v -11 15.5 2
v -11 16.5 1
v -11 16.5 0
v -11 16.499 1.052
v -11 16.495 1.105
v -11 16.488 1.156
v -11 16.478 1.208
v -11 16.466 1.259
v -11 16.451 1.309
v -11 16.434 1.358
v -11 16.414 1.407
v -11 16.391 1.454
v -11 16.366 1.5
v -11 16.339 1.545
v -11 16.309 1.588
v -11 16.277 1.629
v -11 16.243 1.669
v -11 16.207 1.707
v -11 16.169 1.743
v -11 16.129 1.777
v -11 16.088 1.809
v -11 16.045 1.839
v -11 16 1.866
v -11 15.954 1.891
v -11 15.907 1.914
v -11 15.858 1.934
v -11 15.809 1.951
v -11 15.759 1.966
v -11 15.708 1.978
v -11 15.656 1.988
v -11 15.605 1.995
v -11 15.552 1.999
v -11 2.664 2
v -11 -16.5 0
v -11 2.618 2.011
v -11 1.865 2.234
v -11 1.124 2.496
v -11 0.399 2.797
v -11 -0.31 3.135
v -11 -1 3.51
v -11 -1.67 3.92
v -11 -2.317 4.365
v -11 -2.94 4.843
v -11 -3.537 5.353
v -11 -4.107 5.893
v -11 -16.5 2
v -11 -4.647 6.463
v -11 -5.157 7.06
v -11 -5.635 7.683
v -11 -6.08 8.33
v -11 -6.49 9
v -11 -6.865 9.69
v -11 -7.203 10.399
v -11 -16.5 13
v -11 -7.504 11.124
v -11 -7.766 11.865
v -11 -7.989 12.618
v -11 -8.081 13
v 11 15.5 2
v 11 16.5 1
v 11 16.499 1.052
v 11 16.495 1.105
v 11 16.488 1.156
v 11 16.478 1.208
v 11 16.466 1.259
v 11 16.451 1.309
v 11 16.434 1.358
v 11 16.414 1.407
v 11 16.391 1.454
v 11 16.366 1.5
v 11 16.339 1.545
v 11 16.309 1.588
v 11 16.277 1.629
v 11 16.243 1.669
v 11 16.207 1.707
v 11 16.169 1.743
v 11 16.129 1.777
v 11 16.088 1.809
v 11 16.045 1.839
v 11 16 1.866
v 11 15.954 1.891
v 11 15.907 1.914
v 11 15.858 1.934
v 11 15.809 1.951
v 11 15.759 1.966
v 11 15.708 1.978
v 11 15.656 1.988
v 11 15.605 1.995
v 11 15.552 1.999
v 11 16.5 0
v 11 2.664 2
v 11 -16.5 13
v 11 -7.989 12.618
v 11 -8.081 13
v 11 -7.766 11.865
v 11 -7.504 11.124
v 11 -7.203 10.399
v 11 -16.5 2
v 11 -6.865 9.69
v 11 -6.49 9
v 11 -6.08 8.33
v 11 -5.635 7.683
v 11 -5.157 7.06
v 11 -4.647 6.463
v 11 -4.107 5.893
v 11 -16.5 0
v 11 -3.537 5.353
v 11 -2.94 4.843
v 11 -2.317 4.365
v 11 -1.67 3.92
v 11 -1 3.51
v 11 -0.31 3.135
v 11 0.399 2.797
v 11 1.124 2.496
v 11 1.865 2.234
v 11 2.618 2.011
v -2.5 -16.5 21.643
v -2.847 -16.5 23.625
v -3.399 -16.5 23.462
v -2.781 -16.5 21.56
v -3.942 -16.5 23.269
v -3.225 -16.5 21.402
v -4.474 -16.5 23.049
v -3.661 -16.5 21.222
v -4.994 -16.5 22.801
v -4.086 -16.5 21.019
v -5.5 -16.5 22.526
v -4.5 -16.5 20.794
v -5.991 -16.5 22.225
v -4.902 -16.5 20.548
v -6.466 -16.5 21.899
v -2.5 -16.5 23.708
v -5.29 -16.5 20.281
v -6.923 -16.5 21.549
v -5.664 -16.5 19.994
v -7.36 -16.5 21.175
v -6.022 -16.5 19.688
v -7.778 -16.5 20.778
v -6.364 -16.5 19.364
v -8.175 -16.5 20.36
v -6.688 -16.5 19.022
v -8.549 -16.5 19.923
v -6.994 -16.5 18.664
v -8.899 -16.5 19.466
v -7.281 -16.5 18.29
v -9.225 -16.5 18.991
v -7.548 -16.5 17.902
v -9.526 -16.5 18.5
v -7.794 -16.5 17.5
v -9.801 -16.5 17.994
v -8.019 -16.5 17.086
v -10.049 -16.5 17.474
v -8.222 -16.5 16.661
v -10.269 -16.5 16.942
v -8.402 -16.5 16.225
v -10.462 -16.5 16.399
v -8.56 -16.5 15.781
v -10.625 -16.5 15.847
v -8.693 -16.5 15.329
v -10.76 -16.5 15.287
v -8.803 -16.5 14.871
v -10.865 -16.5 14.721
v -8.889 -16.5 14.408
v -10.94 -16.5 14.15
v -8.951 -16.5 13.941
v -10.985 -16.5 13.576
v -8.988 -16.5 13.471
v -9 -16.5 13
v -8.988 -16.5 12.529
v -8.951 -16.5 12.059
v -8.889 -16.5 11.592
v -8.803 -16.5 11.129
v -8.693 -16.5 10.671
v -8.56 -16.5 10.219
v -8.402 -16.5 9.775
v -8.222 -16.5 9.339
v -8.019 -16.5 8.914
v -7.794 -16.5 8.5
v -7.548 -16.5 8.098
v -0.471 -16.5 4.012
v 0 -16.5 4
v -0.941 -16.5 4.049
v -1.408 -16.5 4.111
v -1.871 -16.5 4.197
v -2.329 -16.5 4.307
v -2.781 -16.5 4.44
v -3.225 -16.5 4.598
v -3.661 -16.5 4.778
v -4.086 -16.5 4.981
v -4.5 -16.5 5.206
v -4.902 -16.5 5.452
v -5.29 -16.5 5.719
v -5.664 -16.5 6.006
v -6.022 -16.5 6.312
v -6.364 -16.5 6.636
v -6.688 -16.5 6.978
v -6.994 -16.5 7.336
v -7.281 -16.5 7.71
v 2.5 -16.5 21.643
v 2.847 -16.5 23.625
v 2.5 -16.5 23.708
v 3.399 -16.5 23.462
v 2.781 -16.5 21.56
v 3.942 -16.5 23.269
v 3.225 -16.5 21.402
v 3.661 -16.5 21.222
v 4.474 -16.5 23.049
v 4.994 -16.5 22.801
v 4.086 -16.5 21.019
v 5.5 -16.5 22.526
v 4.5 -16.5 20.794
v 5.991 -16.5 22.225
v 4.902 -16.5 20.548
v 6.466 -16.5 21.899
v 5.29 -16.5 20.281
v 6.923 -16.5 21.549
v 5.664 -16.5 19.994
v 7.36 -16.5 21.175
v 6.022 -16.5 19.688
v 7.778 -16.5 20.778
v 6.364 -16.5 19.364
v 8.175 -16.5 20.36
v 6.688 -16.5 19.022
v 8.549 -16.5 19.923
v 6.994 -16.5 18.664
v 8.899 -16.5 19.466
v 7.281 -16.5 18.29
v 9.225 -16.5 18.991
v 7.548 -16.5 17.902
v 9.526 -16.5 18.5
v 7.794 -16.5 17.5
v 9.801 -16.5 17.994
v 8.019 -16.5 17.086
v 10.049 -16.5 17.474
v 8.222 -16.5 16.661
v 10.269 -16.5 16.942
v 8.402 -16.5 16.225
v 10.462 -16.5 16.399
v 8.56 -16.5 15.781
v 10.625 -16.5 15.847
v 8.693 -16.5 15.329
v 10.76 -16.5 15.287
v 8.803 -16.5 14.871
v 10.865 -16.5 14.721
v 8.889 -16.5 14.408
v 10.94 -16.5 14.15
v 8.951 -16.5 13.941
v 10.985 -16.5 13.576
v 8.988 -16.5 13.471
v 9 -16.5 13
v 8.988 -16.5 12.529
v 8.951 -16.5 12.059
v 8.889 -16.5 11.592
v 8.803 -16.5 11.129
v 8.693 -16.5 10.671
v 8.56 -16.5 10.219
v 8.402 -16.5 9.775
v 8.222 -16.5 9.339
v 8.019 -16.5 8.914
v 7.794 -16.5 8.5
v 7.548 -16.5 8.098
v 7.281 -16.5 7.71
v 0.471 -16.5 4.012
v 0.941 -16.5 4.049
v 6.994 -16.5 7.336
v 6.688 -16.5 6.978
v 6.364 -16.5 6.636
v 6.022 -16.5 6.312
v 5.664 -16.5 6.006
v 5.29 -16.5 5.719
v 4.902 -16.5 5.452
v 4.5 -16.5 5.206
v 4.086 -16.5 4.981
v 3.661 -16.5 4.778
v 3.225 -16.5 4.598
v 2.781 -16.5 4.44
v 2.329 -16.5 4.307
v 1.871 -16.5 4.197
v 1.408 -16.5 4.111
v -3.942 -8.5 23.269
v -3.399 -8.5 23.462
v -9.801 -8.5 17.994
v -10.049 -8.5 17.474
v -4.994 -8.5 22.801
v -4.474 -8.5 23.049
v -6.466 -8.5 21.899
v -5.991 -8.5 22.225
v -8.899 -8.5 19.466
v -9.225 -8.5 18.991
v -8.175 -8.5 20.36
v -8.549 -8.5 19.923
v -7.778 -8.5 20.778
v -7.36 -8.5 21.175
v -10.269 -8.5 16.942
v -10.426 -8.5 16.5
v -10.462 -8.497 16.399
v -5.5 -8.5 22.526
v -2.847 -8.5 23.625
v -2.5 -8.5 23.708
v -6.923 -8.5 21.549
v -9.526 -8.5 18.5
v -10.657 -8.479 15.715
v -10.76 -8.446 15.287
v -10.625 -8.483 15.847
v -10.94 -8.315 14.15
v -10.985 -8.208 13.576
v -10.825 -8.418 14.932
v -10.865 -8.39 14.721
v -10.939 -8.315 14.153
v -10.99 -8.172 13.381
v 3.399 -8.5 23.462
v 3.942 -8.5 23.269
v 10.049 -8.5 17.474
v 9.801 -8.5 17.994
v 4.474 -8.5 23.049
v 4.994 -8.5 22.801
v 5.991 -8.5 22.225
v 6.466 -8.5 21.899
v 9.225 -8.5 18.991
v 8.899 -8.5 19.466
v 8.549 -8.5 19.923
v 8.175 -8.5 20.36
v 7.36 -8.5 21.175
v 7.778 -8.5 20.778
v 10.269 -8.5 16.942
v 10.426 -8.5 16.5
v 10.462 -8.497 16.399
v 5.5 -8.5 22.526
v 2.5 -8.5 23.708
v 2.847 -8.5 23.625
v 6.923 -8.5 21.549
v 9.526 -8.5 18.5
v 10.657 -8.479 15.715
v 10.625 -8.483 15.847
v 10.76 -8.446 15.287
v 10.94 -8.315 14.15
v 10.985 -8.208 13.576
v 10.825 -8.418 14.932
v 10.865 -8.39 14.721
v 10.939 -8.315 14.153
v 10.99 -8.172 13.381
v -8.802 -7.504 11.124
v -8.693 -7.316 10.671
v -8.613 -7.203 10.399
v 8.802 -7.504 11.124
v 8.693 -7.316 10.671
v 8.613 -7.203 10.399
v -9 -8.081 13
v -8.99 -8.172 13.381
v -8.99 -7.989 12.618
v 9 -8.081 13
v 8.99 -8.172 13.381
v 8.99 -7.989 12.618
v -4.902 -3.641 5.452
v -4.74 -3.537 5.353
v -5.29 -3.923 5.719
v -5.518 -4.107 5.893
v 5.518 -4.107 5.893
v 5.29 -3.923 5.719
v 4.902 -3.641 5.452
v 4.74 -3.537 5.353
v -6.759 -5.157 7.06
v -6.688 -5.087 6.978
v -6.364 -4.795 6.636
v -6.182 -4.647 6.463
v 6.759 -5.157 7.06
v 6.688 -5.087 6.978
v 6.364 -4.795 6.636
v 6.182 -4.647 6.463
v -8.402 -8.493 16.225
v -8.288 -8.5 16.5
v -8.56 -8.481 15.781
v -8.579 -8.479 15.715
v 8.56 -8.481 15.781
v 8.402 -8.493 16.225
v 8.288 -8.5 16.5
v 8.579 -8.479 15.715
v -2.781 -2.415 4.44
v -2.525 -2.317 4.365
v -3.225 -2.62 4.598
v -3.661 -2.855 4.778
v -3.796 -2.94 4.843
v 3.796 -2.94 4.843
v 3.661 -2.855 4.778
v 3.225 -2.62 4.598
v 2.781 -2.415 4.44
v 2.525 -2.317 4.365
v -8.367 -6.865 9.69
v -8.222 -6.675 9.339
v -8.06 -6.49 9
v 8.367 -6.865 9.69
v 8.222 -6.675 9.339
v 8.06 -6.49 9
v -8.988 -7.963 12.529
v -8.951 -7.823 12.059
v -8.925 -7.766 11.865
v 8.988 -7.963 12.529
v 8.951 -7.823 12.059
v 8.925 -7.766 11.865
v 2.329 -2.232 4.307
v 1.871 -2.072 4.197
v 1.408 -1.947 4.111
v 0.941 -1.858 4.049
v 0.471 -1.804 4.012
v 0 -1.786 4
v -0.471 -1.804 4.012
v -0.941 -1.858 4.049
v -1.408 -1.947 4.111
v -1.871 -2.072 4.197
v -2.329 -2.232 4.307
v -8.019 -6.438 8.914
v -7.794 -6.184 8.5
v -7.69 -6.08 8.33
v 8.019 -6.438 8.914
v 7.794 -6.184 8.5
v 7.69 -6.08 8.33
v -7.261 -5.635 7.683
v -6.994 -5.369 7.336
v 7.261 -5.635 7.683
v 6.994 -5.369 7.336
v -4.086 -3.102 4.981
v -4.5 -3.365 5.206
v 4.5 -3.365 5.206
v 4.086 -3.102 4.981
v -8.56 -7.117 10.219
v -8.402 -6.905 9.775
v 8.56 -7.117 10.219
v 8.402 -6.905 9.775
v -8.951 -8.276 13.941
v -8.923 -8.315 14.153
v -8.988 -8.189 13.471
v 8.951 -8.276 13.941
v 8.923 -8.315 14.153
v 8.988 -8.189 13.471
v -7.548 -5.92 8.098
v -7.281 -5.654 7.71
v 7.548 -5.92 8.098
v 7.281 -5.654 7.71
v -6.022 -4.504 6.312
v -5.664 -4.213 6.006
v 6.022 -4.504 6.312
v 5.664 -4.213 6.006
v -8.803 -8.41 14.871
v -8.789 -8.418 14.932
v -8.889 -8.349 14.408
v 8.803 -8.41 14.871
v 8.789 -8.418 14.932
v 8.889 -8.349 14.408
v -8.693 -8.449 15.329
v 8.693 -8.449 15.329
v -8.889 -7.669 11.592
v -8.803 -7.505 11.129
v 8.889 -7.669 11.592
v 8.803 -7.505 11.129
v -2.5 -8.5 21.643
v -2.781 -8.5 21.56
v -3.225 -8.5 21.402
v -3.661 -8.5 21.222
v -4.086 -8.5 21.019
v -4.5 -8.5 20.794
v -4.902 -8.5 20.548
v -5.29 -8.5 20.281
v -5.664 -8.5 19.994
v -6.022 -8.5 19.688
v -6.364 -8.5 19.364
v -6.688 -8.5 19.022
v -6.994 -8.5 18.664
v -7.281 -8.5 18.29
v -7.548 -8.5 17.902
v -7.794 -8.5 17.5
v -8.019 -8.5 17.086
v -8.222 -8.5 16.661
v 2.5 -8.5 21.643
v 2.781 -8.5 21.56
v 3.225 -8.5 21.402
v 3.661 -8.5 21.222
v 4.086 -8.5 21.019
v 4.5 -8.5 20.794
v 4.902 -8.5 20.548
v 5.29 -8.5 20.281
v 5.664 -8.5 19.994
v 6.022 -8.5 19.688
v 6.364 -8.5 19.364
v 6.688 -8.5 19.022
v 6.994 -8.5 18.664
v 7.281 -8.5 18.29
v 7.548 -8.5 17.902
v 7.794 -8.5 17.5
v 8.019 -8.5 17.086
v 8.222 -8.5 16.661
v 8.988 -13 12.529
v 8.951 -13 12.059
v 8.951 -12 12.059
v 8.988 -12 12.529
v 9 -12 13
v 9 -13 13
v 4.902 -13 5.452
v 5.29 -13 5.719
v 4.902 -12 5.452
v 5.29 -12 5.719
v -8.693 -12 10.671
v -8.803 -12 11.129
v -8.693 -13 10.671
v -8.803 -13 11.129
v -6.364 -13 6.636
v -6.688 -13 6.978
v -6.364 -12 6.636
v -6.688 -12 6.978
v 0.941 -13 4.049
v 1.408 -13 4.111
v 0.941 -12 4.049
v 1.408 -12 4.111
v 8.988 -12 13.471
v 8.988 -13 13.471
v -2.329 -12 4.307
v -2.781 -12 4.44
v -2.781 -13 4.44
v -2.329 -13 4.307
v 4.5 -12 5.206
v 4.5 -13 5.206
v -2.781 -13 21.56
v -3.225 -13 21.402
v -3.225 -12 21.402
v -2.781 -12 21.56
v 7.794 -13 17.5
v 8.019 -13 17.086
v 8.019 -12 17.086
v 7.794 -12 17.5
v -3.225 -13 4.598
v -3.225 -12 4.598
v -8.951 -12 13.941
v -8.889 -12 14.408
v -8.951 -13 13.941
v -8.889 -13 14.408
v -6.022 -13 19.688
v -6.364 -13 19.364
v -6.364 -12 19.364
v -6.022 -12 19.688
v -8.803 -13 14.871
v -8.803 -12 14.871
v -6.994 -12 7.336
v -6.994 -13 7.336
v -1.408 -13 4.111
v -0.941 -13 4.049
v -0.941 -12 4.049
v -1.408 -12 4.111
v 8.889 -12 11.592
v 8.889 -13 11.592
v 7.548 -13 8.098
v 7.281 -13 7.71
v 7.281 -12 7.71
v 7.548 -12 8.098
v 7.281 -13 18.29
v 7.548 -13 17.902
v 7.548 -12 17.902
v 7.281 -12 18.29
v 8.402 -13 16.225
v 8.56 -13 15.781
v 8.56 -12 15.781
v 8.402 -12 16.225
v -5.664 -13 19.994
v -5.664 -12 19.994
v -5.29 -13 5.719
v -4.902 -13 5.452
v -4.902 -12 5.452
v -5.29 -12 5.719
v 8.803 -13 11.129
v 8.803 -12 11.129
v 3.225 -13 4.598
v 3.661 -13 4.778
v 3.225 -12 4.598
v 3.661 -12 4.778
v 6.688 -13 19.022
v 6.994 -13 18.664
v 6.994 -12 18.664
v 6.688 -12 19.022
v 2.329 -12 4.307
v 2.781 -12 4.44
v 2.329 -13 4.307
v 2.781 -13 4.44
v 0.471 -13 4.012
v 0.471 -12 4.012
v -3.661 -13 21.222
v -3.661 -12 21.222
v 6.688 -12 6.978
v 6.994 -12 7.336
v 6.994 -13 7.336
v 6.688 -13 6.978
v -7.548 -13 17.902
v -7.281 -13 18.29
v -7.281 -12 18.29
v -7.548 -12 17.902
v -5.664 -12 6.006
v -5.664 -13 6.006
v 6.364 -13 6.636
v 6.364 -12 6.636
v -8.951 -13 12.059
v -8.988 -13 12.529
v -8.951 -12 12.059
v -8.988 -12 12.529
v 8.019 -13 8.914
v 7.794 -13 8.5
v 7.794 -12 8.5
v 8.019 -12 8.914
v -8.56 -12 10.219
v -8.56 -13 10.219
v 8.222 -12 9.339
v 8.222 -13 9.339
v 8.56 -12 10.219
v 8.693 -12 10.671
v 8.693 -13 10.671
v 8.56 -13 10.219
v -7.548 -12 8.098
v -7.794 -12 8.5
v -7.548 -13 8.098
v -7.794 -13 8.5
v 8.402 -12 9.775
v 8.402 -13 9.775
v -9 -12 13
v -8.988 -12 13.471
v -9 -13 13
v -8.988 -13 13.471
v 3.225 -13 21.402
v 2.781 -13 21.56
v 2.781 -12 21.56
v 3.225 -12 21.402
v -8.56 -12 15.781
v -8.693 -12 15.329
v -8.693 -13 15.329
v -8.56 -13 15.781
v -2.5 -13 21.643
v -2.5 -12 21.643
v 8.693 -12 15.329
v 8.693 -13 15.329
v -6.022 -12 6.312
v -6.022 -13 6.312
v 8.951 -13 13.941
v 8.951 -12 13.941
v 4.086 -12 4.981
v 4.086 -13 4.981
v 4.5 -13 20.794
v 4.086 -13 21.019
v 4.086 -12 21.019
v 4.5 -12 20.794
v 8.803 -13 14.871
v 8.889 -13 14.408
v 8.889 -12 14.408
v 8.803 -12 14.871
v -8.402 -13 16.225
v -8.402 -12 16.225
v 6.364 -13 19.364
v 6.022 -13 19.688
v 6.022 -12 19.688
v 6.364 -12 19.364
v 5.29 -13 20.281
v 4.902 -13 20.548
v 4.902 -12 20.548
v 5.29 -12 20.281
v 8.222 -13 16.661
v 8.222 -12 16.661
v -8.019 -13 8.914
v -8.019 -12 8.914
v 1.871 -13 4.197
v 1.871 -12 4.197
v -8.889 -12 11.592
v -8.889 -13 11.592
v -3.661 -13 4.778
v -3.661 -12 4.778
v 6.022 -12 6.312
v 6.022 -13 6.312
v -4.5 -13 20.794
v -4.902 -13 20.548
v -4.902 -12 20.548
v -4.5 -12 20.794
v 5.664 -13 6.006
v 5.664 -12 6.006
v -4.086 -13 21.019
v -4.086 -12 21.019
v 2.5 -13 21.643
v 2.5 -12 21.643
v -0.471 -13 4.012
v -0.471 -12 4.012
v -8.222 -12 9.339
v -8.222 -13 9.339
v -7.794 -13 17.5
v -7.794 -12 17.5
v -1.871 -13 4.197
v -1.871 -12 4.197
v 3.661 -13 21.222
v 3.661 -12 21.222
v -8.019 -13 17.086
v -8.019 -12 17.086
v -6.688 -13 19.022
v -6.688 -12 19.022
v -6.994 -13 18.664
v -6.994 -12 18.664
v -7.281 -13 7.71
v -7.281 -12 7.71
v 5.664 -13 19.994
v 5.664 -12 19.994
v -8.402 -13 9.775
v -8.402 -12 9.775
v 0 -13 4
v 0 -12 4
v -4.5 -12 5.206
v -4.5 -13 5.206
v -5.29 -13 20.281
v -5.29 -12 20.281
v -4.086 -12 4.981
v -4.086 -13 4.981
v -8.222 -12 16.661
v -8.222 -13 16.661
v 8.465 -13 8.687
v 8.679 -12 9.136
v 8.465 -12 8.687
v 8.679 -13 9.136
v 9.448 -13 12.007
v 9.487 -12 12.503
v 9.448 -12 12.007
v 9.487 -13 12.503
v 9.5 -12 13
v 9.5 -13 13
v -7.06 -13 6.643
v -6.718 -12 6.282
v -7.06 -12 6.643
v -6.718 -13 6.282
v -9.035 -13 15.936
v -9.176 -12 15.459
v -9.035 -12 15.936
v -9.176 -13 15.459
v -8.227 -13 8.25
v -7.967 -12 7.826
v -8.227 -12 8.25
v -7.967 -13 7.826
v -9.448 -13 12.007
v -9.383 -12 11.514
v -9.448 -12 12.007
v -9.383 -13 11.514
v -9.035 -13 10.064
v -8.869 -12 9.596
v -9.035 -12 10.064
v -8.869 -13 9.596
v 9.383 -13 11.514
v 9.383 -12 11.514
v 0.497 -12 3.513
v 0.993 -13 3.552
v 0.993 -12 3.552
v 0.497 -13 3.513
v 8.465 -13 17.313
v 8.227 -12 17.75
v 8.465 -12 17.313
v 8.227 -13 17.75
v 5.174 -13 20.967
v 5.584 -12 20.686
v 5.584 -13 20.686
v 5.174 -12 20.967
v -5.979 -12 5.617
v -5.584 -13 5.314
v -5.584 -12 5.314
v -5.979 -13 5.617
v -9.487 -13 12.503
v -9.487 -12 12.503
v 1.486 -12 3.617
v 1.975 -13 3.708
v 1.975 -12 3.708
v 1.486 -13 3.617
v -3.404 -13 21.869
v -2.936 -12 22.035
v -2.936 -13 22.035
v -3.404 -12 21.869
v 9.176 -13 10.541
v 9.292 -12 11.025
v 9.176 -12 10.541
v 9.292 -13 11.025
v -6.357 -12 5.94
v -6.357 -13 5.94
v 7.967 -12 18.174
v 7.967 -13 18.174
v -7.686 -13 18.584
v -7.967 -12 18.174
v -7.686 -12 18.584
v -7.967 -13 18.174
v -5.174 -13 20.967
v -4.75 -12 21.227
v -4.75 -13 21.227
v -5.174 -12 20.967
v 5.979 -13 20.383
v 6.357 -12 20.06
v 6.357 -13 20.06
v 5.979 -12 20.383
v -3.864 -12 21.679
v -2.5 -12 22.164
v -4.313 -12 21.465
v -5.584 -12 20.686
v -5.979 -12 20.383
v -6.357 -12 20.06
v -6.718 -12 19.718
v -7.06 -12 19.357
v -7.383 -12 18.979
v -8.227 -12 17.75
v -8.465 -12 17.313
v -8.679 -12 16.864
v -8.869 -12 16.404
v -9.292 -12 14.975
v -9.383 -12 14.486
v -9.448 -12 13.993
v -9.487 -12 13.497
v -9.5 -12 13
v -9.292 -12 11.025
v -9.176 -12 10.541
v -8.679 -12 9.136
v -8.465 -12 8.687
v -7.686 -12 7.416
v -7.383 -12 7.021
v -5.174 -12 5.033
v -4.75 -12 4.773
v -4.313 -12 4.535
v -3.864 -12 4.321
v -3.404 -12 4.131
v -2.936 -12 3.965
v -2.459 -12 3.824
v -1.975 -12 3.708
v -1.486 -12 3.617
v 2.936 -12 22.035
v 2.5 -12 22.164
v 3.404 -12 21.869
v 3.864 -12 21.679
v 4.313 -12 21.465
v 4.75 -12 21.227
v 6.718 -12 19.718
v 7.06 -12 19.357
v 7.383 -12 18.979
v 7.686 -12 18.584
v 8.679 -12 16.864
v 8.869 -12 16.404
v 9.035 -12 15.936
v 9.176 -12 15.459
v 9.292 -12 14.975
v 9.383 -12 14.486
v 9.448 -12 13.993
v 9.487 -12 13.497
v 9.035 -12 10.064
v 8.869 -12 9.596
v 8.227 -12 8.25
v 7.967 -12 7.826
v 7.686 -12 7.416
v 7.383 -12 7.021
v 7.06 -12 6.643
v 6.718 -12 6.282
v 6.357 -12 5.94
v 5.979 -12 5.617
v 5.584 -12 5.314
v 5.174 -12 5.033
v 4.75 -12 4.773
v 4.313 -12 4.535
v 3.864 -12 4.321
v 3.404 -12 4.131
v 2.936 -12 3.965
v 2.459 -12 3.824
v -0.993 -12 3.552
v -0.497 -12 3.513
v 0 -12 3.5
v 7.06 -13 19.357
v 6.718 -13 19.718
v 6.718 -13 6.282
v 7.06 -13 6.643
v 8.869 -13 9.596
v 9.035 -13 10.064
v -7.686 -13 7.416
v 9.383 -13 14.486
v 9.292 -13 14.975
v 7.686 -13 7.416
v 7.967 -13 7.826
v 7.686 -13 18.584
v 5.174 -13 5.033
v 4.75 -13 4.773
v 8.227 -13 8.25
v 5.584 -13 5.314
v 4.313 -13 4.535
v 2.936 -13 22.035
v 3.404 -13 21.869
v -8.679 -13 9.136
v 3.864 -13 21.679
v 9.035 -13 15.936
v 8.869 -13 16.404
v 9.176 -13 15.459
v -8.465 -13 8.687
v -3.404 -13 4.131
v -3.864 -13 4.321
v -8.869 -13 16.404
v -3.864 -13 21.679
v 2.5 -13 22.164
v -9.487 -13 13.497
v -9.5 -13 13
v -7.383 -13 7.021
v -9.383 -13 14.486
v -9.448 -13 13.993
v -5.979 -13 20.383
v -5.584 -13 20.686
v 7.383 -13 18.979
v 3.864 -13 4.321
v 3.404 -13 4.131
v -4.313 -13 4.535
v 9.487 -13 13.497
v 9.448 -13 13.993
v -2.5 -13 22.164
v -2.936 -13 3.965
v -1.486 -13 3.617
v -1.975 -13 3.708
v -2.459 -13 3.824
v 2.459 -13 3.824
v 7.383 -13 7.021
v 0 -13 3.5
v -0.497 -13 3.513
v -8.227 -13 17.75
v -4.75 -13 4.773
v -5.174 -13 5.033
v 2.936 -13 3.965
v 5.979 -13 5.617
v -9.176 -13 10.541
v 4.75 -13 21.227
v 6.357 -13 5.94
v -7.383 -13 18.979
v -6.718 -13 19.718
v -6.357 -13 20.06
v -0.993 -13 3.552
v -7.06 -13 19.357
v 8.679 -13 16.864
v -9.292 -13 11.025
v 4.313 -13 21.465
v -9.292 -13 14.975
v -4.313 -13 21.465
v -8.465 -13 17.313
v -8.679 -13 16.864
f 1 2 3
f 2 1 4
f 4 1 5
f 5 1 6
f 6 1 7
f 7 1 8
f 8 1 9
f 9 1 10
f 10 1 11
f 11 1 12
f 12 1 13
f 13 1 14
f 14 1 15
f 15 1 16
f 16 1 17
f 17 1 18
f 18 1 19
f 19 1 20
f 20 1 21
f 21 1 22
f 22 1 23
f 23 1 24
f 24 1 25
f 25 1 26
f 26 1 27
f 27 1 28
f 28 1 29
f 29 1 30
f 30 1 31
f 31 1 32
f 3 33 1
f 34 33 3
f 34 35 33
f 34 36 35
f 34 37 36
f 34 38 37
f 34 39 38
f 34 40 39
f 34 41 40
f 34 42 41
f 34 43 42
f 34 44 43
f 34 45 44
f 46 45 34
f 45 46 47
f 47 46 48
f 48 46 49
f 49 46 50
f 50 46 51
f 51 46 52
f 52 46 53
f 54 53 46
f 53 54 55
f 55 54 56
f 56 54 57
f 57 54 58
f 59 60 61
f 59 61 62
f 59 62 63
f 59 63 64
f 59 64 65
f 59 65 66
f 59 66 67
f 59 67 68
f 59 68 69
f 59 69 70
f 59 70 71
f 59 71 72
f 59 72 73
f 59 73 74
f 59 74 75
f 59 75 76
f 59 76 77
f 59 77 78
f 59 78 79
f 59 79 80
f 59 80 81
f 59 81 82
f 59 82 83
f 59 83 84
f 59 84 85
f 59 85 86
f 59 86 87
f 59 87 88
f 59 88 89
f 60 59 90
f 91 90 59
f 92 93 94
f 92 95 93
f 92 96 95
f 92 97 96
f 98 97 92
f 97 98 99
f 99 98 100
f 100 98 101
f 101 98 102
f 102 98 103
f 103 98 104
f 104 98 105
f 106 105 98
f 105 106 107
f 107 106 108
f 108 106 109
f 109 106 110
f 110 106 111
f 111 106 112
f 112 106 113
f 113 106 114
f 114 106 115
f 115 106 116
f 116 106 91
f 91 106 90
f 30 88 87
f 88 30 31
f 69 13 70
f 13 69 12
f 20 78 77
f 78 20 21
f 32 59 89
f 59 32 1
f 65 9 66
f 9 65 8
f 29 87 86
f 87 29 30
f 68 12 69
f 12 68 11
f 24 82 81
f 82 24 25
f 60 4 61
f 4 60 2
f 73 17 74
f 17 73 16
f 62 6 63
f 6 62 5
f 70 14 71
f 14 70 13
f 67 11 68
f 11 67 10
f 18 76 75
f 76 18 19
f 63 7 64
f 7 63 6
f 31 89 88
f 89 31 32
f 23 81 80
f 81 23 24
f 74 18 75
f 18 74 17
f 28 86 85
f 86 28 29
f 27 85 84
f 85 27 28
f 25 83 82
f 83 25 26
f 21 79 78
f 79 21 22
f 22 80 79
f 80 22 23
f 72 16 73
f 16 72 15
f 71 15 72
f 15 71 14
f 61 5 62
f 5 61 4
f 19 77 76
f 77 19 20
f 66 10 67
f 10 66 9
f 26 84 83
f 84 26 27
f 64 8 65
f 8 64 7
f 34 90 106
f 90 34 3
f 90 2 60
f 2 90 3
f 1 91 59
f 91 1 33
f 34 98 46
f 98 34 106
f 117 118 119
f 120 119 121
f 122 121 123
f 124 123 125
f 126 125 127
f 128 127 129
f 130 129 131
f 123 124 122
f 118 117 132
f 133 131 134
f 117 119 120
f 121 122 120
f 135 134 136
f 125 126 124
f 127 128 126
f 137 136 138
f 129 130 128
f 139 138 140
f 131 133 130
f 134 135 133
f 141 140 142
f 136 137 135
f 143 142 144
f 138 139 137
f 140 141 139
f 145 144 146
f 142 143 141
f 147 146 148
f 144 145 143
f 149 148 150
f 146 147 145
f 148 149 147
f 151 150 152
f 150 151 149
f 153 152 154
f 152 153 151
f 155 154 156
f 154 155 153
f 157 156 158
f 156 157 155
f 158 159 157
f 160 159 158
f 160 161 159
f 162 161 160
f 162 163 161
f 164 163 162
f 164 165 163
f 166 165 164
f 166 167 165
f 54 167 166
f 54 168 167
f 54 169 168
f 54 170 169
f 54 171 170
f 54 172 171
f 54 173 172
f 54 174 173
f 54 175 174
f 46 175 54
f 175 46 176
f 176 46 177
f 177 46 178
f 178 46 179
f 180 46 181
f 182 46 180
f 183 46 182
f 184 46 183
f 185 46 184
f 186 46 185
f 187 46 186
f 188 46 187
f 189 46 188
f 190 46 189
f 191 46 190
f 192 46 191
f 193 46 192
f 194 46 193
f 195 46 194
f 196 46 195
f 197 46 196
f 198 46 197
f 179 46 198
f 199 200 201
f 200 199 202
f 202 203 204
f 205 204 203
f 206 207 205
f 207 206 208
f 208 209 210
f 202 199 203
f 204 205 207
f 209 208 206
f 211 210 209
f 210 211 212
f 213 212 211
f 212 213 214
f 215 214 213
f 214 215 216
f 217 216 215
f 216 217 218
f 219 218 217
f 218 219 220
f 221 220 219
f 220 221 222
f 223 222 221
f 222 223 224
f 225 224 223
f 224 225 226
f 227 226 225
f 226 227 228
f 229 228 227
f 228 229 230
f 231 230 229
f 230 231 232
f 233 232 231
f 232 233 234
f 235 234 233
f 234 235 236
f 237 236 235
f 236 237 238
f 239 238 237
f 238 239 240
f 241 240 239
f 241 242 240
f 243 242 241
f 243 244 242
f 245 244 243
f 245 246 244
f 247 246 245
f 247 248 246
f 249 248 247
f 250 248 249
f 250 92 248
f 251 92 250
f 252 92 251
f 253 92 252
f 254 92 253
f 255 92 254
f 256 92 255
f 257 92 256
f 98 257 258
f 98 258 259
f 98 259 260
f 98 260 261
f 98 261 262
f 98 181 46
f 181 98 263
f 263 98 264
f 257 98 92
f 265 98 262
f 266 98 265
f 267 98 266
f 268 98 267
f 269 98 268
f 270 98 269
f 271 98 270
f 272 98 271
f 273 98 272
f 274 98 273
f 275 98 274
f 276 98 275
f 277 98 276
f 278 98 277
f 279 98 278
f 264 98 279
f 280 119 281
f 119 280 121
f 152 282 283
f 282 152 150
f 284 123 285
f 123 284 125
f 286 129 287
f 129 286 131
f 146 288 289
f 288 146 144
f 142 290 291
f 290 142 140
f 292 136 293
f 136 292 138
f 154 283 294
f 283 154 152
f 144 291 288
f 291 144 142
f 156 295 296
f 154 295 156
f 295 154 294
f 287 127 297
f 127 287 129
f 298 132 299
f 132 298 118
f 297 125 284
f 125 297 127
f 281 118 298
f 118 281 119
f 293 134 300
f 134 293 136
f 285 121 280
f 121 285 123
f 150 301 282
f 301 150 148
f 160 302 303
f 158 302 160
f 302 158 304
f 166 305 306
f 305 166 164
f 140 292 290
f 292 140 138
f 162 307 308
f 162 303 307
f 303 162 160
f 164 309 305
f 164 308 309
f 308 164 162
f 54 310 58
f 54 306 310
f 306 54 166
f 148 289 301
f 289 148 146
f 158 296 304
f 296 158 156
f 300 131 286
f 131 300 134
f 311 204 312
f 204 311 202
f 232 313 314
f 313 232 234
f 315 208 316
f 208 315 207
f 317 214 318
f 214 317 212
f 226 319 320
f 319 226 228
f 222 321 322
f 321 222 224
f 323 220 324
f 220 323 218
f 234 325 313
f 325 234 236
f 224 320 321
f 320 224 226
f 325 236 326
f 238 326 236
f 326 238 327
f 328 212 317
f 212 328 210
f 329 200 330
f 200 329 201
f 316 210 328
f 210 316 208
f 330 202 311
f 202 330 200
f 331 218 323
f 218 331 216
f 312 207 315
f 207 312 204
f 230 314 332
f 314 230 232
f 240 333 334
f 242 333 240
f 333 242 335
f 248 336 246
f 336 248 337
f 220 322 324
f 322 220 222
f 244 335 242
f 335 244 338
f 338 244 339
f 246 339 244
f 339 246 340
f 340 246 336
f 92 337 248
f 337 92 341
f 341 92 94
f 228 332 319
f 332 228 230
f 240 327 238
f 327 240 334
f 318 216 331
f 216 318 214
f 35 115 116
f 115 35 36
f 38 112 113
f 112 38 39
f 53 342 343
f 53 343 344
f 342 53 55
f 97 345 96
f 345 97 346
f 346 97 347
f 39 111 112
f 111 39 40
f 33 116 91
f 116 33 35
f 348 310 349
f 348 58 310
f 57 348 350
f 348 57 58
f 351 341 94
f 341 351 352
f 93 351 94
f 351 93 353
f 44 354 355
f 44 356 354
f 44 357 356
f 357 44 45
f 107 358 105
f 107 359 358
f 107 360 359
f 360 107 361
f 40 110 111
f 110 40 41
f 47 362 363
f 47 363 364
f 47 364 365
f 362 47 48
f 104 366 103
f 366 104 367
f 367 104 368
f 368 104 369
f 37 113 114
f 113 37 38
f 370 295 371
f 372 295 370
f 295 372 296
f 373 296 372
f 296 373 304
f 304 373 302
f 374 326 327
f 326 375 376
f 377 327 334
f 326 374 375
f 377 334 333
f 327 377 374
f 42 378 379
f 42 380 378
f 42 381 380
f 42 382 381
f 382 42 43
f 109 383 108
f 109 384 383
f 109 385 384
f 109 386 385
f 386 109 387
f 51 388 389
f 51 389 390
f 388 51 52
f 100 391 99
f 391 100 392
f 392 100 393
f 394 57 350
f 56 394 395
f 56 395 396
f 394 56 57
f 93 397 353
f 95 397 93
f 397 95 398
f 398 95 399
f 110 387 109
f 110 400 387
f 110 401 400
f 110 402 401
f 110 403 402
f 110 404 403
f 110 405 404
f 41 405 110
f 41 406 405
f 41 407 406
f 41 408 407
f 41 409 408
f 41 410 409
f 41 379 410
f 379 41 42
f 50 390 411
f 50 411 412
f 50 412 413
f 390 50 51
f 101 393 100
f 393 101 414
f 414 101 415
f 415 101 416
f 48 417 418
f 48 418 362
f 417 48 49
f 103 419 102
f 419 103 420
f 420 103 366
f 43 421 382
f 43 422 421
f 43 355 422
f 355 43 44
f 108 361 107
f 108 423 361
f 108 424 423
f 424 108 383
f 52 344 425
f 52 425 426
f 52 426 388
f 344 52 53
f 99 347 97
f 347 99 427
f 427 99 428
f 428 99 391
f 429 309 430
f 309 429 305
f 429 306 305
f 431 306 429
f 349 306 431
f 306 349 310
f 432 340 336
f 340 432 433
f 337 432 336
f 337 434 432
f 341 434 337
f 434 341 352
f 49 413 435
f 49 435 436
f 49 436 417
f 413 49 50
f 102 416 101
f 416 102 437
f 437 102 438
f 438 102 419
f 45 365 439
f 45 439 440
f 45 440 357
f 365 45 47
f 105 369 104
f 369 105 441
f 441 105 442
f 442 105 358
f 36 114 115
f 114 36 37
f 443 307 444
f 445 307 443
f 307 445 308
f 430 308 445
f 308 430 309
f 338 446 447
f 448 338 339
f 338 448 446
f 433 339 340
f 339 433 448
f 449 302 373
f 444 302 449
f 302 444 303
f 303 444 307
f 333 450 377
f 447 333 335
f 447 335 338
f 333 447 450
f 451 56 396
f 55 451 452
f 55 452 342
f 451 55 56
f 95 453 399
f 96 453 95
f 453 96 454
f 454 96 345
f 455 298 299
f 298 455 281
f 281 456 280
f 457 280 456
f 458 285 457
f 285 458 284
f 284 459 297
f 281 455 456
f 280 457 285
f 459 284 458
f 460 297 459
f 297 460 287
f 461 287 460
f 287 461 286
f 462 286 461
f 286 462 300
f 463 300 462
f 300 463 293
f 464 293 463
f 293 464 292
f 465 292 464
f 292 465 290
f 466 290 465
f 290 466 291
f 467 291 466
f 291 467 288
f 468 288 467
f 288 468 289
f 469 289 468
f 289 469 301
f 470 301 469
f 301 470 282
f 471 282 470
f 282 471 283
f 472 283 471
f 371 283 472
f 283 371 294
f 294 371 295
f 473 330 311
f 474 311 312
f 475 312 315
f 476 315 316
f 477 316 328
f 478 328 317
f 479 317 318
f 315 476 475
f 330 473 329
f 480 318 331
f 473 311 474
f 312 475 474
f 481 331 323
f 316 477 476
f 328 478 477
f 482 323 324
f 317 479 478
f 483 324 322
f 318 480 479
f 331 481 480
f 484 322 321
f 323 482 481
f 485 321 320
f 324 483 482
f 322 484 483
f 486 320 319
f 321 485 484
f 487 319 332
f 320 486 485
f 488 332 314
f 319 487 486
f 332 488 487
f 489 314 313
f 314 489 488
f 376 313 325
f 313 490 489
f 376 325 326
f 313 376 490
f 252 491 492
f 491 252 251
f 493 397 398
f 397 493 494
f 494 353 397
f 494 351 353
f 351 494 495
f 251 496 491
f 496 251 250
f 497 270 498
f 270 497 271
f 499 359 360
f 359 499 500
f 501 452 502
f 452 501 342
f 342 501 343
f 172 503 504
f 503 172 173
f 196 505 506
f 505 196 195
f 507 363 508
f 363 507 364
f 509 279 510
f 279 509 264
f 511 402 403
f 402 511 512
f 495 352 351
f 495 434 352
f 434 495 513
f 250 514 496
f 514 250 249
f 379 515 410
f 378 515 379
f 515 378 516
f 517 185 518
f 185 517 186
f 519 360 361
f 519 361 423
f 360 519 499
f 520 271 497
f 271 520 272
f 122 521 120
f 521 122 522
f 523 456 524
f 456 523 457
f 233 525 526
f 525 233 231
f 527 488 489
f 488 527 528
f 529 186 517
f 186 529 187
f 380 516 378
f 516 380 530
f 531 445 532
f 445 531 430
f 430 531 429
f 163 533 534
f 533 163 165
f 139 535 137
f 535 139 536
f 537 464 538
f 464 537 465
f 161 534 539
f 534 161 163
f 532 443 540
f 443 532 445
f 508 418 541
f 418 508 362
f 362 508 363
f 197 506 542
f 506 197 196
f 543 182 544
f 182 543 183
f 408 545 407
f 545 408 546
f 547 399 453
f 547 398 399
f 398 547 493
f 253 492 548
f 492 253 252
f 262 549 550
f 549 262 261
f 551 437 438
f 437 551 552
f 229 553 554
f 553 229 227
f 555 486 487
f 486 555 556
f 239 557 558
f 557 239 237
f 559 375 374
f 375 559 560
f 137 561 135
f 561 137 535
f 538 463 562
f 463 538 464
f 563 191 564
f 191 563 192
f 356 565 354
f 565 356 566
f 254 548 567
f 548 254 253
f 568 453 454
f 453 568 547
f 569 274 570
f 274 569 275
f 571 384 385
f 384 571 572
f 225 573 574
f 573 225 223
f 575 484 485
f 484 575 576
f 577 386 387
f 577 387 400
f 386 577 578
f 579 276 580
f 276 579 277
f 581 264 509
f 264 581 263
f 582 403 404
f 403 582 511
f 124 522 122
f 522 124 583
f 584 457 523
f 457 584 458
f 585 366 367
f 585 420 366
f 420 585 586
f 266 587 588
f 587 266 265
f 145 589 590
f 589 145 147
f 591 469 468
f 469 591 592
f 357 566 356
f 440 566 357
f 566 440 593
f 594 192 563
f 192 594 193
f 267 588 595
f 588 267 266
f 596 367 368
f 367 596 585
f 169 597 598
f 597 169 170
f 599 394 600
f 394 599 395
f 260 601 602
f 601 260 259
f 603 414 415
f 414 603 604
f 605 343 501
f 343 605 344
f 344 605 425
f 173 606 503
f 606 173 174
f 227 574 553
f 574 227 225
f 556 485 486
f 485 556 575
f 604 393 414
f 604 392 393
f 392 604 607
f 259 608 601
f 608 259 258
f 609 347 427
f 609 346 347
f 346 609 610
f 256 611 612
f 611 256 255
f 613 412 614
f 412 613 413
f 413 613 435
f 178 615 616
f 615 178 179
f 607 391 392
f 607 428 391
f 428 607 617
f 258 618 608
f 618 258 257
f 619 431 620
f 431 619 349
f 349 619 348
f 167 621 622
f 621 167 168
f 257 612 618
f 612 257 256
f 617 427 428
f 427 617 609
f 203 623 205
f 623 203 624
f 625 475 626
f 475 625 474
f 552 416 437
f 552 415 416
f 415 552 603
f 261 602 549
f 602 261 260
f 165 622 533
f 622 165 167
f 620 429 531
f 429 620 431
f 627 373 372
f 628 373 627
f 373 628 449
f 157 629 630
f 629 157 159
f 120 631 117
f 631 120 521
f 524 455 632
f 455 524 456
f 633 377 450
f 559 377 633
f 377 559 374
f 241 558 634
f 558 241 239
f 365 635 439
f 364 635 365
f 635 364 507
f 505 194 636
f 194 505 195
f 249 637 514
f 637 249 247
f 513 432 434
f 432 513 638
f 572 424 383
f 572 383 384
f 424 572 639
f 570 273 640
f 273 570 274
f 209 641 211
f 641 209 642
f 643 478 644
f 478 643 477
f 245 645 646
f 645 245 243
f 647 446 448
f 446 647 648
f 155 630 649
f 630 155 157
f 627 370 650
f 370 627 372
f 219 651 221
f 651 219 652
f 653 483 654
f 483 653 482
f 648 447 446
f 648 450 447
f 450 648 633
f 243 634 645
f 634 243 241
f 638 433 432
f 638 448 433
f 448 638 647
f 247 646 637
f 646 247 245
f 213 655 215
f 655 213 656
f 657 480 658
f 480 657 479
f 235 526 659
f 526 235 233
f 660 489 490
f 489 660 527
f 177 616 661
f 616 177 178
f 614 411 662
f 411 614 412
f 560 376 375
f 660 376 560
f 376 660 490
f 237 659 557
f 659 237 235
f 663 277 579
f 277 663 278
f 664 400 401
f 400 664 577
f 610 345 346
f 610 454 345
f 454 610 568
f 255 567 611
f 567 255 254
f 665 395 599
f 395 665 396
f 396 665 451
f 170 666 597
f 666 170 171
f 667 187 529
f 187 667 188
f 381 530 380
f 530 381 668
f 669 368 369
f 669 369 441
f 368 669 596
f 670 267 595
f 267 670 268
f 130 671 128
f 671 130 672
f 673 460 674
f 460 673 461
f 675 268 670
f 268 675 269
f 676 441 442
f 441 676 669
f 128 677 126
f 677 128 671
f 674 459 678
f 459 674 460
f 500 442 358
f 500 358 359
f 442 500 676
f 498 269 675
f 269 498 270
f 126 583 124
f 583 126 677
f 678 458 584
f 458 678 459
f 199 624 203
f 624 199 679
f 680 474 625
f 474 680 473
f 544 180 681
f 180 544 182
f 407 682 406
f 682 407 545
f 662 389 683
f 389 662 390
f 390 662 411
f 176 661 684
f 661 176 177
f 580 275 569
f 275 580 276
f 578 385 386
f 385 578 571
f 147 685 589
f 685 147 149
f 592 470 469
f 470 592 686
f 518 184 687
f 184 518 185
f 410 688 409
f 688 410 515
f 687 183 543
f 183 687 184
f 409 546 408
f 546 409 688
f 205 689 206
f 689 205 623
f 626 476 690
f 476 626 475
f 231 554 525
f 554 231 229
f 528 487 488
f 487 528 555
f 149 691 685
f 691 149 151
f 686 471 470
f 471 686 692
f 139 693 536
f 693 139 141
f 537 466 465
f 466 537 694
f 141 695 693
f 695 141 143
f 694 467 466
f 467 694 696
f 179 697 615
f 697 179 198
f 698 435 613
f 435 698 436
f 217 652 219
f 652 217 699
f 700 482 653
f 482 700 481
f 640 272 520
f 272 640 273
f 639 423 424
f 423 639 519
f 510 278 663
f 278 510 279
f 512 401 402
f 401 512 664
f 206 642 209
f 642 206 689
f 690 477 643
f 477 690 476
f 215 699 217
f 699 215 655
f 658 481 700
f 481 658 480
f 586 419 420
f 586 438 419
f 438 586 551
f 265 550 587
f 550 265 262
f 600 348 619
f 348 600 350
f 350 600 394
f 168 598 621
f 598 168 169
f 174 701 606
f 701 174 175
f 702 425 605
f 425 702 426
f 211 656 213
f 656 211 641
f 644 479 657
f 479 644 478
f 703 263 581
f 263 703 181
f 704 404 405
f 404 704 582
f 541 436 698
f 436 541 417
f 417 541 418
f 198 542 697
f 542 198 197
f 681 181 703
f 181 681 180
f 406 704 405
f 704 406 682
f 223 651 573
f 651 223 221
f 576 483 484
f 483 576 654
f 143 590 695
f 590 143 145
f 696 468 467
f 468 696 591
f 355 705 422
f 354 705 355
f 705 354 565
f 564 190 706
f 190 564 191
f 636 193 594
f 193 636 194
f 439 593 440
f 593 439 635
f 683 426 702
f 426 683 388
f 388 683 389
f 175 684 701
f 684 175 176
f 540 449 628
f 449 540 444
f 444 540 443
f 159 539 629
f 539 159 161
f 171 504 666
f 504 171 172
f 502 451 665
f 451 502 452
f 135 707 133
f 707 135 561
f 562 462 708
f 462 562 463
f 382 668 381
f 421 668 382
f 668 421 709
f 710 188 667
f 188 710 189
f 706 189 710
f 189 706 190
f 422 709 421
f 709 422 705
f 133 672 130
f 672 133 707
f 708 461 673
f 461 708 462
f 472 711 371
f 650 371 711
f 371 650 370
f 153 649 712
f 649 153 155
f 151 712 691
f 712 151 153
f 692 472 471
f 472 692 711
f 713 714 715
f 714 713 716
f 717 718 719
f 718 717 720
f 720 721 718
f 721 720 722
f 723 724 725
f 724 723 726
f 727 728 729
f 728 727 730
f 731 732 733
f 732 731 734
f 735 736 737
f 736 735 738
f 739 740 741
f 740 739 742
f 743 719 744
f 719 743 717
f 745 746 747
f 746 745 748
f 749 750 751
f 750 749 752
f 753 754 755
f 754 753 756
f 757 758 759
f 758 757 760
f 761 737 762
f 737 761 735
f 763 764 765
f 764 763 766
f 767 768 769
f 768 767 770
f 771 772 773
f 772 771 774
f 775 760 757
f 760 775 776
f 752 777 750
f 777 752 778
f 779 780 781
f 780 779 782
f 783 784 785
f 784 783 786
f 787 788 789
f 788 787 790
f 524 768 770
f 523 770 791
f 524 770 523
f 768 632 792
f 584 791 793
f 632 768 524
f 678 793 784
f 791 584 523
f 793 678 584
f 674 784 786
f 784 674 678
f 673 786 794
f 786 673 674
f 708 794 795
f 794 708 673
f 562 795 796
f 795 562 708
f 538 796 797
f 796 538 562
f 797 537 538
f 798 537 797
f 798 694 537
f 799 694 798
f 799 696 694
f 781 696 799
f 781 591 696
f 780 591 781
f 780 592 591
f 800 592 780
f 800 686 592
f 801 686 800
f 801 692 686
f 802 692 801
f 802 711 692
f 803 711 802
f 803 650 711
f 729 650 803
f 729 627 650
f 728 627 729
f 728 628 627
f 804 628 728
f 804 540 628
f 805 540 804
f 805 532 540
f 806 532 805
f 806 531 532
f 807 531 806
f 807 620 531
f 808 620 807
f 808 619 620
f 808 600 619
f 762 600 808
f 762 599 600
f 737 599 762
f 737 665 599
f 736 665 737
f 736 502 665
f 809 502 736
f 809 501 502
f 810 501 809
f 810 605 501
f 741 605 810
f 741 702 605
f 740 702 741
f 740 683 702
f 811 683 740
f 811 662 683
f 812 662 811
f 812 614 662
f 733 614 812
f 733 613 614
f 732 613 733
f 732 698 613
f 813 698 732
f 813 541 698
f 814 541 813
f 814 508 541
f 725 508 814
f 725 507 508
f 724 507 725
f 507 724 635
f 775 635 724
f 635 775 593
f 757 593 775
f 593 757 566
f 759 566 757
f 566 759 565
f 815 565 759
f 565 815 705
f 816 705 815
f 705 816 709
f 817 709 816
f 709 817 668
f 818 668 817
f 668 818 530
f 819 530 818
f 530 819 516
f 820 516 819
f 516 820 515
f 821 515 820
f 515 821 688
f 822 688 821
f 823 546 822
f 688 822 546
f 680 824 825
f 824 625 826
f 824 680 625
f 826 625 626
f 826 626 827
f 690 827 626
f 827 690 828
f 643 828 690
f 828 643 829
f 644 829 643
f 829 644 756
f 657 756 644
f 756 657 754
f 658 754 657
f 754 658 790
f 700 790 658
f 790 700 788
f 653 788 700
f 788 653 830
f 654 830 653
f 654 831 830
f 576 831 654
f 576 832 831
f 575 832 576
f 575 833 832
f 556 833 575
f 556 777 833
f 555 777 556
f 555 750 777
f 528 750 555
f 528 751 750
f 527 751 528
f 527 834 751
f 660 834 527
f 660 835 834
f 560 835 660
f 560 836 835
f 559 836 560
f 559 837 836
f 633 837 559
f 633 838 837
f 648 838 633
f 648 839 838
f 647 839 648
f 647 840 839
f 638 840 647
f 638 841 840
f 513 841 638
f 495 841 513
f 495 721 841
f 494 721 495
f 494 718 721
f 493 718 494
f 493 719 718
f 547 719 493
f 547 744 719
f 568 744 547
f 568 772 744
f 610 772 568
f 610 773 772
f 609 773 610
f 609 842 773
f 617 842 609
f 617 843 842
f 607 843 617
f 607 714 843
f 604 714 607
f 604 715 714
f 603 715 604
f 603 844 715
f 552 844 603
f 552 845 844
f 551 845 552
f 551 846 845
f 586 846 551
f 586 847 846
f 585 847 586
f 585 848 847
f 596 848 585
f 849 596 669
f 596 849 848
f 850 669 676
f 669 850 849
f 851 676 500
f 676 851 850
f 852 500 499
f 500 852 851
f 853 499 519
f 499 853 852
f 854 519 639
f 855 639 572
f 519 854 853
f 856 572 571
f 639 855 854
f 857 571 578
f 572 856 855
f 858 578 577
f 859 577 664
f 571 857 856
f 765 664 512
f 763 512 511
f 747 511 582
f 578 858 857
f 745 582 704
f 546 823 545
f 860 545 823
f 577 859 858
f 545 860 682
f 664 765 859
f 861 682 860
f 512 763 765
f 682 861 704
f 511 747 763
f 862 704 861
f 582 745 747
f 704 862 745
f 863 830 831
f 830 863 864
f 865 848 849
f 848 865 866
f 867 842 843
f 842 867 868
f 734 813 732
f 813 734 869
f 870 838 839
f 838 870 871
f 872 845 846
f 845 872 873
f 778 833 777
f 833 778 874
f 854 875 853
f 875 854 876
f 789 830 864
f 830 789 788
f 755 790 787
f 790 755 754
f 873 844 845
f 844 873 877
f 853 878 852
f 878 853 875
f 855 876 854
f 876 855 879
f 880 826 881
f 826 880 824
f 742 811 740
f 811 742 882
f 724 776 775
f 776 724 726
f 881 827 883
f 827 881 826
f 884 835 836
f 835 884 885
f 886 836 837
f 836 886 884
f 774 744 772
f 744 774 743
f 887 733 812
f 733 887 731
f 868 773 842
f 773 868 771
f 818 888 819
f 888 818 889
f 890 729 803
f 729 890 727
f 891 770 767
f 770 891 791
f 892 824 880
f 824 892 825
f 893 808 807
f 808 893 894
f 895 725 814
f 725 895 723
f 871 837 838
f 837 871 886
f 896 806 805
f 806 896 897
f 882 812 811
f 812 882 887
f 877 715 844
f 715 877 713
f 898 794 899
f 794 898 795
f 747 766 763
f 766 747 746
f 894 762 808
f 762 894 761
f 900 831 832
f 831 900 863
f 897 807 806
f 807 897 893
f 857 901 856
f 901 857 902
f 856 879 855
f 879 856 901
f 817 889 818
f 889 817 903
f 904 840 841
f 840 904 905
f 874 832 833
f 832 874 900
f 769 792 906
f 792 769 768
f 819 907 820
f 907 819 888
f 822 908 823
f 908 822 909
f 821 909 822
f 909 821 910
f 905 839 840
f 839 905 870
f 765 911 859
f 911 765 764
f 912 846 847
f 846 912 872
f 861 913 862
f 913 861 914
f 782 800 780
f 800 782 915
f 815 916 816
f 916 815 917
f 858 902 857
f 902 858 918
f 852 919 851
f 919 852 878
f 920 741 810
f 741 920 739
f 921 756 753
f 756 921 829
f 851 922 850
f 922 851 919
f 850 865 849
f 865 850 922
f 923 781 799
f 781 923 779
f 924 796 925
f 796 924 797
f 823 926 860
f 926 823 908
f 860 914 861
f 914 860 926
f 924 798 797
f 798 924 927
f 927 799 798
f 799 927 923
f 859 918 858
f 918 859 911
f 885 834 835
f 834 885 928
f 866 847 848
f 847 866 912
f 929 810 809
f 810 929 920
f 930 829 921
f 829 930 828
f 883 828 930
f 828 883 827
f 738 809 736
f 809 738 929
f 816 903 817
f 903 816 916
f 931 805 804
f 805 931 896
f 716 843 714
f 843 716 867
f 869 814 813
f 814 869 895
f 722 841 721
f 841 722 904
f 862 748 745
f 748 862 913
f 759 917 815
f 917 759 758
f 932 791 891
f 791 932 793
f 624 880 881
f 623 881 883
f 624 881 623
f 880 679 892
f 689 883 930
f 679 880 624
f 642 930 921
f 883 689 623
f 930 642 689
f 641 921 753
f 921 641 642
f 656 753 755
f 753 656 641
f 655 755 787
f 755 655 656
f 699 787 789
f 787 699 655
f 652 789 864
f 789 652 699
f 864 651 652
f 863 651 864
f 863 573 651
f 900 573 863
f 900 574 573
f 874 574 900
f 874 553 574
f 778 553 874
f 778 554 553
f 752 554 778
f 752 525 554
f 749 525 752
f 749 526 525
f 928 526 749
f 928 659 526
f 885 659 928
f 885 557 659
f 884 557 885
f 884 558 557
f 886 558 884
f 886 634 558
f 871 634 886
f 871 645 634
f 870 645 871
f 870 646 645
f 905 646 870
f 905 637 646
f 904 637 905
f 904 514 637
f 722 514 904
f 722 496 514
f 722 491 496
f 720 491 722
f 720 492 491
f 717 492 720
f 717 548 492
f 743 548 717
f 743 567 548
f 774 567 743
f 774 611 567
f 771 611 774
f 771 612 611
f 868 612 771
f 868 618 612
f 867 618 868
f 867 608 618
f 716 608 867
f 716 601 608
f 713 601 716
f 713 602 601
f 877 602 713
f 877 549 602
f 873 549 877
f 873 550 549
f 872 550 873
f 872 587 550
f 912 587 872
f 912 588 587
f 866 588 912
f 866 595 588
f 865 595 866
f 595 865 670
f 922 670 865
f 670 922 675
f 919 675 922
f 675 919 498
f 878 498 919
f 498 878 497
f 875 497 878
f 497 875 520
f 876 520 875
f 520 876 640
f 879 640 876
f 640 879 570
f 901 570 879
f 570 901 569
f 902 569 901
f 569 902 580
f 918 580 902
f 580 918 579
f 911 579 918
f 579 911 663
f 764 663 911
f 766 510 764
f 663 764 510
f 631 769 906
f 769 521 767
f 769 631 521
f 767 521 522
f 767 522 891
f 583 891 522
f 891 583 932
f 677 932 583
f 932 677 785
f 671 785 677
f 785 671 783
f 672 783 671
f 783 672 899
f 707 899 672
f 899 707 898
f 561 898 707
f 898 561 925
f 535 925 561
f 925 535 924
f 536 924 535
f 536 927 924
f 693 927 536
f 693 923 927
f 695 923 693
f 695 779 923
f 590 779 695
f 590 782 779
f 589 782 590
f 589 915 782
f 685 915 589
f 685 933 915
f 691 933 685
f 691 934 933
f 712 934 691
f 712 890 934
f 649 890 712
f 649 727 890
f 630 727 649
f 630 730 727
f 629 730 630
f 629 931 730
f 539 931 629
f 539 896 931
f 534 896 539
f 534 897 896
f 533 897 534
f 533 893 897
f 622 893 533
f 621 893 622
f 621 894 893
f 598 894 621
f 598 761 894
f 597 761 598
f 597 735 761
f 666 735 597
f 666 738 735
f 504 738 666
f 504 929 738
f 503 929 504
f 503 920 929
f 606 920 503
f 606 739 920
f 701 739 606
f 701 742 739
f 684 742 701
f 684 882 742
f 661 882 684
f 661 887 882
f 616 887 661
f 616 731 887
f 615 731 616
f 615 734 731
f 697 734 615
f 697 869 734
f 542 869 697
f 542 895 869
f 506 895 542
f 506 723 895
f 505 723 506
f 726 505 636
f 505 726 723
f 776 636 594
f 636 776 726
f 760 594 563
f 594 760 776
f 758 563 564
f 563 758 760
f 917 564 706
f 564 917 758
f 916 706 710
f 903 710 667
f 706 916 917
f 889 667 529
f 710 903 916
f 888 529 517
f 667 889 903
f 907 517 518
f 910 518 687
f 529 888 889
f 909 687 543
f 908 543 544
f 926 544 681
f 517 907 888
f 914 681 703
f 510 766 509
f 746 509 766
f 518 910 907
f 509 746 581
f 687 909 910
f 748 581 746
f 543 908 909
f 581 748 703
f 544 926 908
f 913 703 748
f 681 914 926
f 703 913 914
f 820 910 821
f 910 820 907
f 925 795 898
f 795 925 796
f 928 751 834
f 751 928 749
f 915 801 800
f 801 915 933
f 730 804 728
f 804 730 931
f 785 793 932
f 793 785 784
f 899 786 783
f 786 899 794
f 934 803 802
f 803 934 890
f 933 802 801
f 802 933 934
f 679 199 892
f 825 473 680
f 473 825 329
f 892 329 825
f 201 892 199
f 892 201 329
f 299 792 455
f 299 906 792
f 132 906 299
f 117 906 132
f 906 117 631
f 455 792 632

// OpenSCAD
detail = 120; // decrease to speed up rendering

//parameters to make nice side-aligned ringster
//chip_x = 22;
//chip_y = 33;
//chip_z = 2;
//top_plate_front_curvature = 1;
//top_plate_back_curvature = 0;
//ring_front_curvature = 15;
//ring_back_curvature = 0;
//ring_width = 6;
//ring_height = chip_x;
//ring_position = 8; //chip_x = 22, width = 6: min = 8, max = 33
//ring_curvature = chip_x / 2;
//finger_diameter = 20;

chip_x = 22;
chip_y = 33;
chip_z = 2;
top_plate_front_curvature = 1;
top_plate_back_curvature = 0;
ring_front_curvature = 15;
ring_back_curvature = 0;
ring_width = 6;
ring_height = chip_x;
ring_position = 8; //chip_x = 22, width = 6: min = 8, max = 33
ring_curvature = chip_x / 2;
finger_diameter = 18;



difference() {
    ringster();
    translate([0,0, 20])cube([5,50,10], true);
}

module ringster()
{
    
    rotate([180, 0, 0]) //rotate upside down for printing
    translate([0, 0, - chip_z / 2]) //place on floor
    union()
    {
        top_plate();
        ring();
    }
}


module ring()
{
    difference()
    {
        ring_element();     //base block
        ring_cutout();      //minus the ring base
        ring_hole_cutout(); //minus the finger hole
        ring_incision();    //minus dent in ring
    }
}

//thin disk just inside the ring hole
module ring_incision()
{
    rotate([90,0,0])
    translate([0, - chip_x / 2 - chip_z / 2, ring_position - ring_width / 2 - 18])
    difference()
    {
        cylinder(1, finger_diameter / 2 + 0.5, finger_diameter / 2 + 0.5, false, $fn=detail);
    }
}

//long cylinder piercing the base block
module ring_hole_cutout()
{
    rotate([90,0,0])
    translate([
        0, 
        - chip_z / 2 - ring_height / 2,  
        - chip_y / 2 - 1
    ])
    cylinder(chip_y + 2, finger_diameter / 2, finger_diameter / 2, false, $fn=detail);
}

//base block chunk to be carved
module ring_element()
{
    translate([0, 0, - chip_z / 2 - ring_height / 2])
    rotate([0,0,90])
    both_sided_spade(chip_y, chip_x, ring_height, ring_curvature); //why use spade? Just cube would work
}

//cut out the space in front of and behind what will become the ring
module ring_cutout()
{
    //front
    rotate([0,180,0])
    translate([
        0,
        -ring_position - 5, // - 5 for a bit of extra margin
        chip_z / 2 + chip_x / 2
        ])
    both_sided_spade(
        ring_height + 1, 
        chip_y + 10, // translated - 5, so y is * -2
        ring_height + 1,
        ring_front_curvature
    );
    
    //back
    rotate([0,180,0])
    translate([
        0,
        -ring_position + 35 + ring_width + 5, // + 5 for extra margin in case ring shifted too much
        chip_z / 2 + chip_x / 2
        ])
    both_sided_spade(
        ring_height + 1, 
        chip_y + 10, // translated + 5, so y is * 2
        ring_height + 1, 
        ring_back_curvature
        );
}

//Mount the microcontroller atop this
module top_plate()
{
    intersection()
    {
        spade(chip_x, chip_y, chip_z, top_plate_back_curvature);
        rotate([0,0,180])
        spade(chip_x, chip_y, chip_z, top_plate_front_curvature);
    }
}


//A thing that is shaped like U
module both_sided_spade(x, y, z, rounding)
{
    intersection()
    {
        spade(x, y, z, rounding);
        rotate([0,0,180])
        spade(x, y, z, rounding);
    }
}

//make sure rounding is smaller than all x, y, z, or unexpected things may happen
//rounding appears along edge at +y, -z
module spade(x, y, z, rounding)
{
    translate([-x/2, -y/2, -z/2])
    {
        union()
        {
            cube([x, y - min(rounding, z), min(rounding, z)], false);
            translate([0, 0, min(rounding, z)])
            cube([x, y, z - min(rounding, z)], false);
            
            union()
            {
                intersection()
                {
                    cube([x, y, z], false);
                    translate([x / 2, y - rounding, min(rounding, z)])
                    rotate([0,90,0])
                    cylinder(x, rounding, rounding, true, $fn=detail);
                }
                translate([0, y - min(rounding, z), min(rounding, z)])
                cube([x, min(rounding, z), z - min(rounding, z)], false);
            }
        }
    }
}
